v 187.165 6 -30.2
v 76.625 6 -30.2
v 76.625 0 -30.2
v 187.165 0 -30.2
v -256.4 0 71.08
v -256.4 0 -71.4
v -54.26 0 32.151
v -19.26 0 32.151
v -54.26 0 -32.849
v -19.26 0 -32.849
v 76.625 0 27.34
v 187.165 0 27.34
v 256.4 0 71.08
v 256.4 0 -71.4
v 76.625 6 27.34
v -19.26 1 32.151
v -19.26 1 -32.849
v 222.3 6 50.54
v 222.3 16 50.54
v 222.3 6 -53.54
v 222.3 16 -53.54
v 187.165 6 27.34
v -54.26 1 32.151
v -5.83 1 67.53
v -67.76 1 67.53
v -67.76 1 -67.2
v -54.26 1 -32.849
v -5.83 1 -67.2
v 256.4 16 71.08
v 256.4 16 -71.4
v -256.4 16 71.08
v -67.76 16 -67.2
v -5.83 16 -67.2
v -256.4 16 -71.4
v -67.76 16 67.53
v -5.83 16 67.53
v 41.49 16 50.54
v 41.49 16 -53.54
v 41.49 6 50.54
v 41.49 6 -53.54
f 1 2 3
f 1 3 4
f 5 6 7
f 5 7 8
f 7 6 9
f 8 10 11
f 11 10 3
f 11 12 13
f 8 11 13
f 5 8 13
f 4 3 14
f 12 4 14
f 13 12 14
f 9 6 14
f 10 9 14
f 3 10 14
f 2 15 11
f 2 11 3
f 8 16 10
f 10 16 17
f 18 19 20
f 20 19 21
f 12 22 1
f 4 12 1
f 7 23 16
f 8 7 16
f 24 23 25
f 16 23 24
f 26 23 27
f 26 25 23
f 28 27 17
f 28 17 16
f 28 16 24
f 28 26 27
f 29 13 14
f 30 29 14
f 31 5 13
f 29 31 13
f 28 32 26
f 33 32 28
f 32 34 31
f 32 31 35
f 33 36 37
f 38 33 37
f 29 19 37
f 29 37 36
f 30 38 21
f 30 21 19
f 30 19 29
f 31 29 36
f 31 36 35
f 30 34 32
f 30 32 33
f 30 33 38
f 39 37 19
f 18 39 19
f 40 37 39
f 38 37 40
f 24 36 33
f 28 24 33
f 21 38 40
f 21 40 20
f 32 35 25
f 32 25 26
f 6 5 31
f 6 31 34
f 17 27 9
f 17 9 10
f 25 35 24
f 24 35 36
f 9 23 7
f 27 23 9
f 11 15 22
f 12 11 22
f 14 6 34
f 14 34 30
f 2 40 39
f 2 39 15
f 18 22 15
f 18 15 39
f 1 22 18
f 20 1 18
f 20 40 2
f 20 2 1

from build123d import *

# Parameters (mm, degrees)
SKETCH1_W           = 512.8
SKETCH1_H           = 142.48
BOSS_EXTRUDE1_DEPTH = 16
SKETCH5_W           = 180.81
SKETCH5_H           = 104.08
CUT_EXTRUDE2_DEPTH  = 10
SKETCH6_W           = 110.54
SKETCH6_H           = 57.54
CUT_EXTRUDE3_DEPTH  = 267.636306605
SKETCH7_W           = 61.93
SKETCH7_H           = 134.73
CUT_EXTRUDE4_DEPTH  = 15
SKETCH8_W           = 35
SKETCH8_H           = 65
CUT_EXTRUDE5_DEPTH  = 5


with BuildPart() as part:
    # Sketch1 → Boss-Extrude1 (new body)
    with BuildSketch(Plane(origin=(0, 0, 0), x_dir=(1, 0, 0), z_dir=(0, 1, 0))):
        with Locations((0, 0.16)):
            Rectangle(SKETCH1_W, SKETCH1_H)
    extrude(amount=BOSS_EXTRUDE1_DEPTH)

    # Sketch5 → Cut-Extrude2 (cut)
    with BuildSketch(Plane(origin=(0, 16, 0), x_dir=(1, 0, 0), z_dir=(0, 1, 0))):
        with Locations((131.895, 1.499952895)):
            Rectangle(SKETCH5_W, SKETCH5_H)
    extrude(amount=-CUT_EXTRUDE2_DEPTH, mode=Mode.SUBTRACT)

    # Sketch6 → Cut-Extrude3 (cut, through all)
    with BuildSketch(Plane(origin=(0, 16, 0), x_dir=(1, 0, 0), z_dir=(0, 1, 0))):
        with Locations((131.895, 1.429952895)):
            Rectangle(SKETCH6_W, SKETCH6_H)
    extrude(amount=-CUT_EXTRUDE3_DEPTH, mode=Mode.SUBTRACT)

    # Sketch7 → Cut-Extrude4 (cut)
    with BuildSketch(Plane(origin=(0, 16, 0), x_dir=(1, 0, 0), z_dir=(0, 1, 0))):
        with Locations((-36.795, -0.164973308)):
            Rectangle(SKETCH7_W, SKETCH7_H)
    extrude(amount=-CUT_EXTRUDE4_DEPTH, mode=Mode.SUBTRACT)

    # Sketch8 → Cut-Extrude5 (cut)
    with BuildSketch(Plane(origin=(0, 1, 0), x_dir=(1, 0, 0), z_dir=(0, 1, 0))):
        with Locations((-36.76, 0.349234115)):
            Rectangle(SKETCH8_W, SKETCH8_H)
    extrude(amount=-CUT_EXTRUDE5_DEPTH, mode=Mode.SUBTRACT)


solid = part.part
